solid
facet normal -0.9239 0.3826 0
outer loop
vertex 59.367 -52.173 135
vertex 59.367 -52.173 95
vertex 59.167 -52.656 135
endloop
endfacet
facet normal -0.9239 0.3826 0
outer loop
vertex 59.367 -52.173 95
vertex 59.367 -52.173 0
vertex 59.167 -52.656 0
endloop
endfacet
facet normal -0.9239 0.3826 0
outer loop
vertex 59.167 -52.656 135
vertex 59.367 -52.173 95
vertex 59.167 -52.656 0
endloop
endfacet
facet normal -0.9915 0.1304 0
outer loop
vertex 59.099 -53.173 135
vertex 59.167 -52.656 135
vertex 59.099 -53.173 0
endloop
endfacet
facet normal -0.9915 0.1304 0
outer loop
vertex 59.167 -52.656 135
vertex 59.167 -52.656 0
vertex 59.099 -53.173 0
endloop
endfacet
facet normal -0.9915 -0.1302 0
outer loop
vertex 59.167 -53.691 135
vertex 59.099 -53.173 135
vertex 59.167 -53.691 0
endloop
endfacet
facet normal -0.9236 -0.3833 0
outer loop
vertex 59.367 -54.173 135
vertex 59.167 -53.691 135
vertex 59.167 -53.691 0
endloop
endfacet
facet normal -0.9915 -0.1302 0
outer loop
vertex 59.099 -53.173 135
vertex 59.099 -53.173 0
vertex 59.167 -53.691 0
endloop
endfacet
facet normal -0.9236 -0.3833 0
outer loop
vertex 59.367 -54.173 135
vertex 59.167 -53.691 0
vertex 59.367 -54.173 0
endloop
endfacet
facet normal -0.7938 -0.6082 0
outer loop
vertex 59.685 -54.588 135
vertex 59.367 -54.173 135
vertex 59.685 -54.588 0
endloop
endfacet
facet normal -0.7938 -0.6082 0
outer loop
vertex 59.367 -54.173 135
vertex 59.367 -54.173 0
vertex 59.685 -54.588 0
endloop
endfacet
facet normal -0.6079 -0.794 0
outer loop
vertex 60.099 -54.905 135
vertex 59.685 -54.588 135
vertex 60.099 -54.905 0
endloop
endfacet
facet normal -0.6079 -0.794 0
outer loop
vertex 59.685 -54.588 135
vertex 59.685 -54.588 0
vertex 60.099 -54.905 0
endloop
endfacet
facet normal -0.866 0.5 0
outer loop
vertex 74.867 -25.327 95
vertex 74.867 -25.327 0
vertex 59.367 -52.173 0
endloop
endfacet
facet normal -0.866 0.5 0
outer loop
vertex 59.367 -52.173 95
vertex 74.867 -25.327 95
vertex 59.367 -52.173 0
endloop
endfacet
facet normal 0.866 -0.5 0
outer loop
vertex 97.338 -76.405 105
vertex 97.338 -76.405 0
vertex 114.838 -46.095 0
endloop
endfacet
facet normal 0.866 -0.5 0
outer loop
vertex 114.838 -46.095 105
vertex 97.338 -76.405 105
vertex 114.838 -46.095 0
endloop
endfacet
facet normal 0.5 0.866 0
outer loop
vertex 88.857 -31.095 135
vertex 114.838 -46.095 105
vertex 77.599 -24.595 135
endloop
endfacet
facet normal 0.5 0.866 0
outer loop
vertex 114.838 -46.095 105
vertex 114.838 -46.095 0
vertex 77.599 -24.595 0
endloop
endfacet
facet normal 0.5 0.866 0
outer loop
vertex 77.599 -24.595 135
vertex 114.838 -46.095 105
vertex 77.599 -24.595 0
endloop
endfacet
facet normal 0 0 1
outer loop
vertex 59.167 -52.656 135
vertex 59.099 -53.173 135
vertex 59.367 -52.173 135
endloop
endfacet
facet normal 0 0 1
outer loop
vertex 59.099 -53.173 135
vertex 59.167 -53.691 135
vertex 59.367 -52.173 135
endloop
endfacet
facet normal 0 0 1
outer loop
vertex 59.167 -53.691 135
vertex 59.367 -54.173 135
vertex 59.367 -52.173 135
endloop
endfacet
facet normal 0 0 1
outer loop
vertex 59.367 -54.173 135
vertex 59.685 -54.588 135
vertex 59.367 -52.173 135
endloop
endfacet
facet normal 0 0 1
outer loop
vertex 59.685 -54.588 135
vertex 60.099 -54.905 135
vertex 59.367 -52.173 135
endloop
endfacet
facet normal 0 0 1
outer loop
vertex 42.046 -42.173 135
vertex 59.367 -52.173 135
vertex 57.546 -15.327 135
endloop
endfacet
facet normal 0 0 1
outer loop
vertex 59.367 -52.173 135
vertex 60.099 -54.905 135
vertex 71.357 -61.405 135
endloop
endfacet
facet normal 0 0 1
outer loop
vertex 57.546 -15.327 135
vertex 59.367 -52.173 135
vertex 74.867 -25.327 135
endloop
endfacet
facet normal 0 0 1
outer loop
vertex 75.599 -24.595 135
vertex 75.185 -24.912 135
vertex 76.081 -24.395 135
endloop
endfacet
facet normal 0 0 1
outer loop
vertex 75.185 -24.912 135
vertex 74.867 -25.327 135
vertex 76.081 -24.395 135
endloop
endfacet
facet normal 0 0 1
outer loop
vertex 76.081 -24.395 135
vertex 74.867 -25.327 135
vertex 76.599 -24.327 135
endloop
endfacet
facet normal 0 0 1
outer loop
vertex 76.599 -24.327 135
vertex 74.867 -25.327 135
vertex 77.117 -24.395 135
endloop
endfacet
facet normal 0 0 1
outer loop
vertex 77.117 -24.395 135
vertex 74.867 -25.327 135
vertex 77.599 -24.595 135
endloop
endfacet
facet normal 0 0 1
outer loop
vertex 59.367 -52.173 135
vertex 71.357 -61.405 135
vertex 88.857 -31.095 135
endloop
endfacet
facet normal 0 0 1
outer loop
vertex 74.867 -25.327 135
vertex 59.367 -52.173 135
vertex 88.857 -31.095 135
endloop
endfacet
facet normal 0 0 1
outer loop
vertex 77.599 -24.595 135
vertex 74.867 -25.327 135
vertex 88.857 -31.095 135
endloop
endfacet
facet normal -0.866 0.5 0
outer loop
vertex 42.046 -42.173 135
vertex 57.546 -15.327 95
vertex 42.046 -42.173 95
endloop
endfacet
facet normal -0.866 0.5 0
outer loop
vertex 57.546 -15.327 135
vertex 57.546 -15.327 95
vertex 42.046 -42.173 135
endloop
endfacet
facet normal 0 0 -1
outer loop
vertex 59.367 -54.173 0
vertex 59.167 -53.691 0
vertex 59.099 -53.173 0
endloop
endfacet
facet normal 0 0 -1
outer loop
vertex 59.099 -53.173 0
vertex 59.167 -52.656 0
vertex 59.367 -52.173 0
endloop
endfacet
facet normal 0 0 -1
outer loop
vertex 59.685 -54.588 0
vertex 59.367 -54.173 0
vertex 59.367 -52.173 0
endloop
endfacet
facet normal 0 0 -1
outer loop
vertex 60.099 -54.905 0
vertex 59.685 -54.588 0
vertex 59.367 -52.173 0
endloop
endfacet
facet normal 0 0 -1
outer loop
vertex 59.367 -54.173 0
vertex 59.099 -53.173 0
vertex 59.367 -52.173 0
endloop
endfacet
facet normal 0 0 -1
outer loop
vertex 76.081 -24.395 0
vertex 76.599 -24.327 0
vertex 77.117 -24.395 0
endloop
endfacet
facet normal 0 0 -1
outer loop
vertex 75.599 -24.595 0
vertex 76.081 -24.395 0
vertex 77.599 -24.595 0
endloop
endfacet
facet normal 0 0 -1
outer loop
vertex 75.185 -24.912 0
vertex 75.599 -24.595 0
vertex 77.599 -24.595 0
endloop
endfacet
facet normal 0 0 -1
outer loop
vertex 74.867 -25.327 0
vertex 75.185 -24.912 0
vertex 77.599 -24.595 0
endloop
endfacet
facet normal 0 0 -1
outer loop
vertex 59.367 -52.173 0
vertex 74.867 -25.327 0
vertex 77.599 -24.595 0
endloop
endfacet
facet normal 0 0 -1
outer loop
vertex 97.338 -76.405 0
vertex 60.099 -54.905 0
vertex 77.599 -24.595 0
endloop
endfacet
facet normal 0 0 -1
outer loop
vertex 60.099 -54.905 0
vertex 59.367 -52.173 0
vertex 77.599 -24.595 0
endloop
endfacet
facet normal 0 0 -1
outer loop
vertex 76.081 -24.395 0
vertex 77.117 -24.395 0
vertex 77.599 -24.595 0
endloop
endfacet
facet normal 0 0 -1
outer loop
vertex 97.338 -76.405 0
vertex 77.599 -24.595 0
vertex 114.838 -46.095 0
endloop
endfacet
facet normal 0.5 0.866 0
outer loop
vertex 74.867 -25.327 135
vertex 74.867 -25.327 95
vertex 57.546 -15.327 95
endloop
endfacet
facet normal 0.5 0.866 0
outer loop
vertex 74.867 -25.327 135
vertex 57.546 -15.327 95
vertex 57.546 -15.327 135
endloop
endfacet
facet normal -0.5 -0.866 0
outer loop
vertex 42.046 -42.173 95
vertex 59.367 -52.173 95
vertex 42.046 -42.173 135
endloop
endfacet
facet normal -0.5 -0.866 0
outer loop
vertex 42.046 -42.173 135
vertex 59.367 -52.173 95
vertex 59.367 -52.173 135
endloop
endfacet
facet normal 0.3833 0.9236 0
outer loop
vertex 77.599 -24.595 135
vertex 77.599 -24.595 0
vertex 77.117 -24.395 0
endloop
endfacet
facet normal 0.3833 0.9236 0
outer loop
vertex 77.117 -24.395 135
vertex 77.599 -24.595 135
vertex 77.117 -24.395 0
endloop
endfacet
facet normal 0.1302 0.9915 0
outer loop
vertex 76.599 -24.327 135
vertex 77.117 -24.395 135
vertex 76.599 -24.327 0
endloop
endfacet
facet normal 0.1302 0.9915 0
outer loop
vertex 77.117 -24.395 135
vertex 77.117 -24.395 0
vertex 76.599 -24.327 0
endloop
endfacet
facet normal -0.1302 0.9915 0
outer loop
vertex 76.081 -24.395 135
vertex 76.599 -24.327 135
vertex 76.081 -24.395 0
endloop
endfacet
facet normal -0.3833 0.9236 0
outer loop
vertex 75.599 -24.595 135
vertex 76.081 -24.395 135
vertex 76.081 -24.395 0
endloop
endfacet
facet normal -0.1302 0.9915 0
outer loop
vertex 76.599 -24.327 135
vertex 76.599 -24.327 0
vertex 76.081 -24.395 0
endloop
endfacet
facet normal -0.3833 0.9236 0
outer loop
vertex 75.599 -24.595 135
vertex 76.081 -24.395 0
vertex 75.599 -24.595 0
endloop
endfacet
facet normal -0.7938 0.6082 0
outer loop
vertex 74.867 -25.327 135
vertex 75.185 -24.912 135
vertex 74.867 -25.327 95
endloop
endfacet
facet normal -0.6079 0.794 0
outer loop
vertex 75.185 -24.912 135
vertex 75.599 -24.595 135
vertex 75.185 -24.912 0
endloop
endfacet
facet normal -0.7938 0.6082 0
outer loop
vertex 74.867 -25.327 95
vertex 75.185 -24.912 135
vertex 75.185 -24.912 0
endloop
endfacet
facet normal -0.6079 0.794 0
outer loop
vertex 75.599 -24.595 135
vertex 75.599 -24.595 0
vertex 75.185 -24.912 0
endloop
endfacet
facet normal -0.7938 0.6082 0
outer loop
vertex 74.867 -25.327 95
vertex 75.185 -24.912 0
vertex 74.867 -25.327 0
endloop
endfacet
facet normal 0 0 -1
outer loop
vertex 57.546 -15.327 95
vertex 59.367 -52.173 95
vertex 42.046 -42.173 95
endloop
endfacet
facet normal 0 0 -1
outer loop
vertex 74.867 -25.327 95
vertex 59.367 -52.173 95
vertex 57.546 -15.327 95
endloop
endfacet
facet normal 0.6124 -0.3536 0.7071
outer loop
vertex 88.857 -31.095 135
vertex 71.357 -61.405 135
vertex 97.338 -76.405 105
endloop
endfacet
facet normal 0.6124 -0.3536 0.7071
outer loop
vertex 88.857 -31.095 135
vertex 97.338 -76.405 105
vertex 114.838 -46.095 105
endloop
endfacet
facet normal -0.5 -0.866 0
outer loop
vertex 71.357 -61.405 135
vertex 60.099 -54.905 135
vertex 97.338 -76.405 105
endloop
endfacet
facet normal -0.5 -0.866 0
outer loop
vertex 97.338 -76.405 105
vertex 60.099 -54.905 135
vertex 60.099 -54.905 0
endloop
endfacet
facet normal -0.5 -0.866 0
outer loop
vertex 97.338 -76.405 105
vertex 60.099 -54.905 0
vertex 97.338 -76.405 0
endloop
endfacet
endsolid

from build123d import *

# Parameters (mm, degrees)
BOSS_EXTRUDE1_DEPTH = 135
SKETCH3_W           = 40
SKETCH3_H           = 31
BOSS_EXTRUDE2_DEPTH = 20
CHAMFER1_SIZE       = 30


with BuildPart() as part:
    # Sketch2 → Boss-Extrude1 (new body)
    with BuildSketch(Plane.XY):
        with BuildLine():
            Line((114.838111964, -46.094555434), (77.599019601, -24.594555434))
            ThreePointArc((77.599019601, -24.594555434), (76.081381511, -24.394754589), (74.866968793, -25.326606241))
            Line((74.866968793, -25.326606241), (59.366968793, -52.173393759))
            ThreePointArc((59.366968793, -52.173393759), (59.167167948, -53.691031849), (60.099019601, -54.905444566))
            Line((60.099019601, -54.905444566), (97.338111964, -76.405444566))
            Line((97.338111964, -76.405444566), (114.838111964, -46.094555434))
        make_face()
    extrude(amount=BOSS_EXTRUDE1_DEPTH)

    # Sketch3 → Boss-Extrude2 (add)
    with BuildSketch(Plane(origin=(67.116968793, -38.75, 0), x_dir=(0, 0, 1), z_dir=(-0.866025404, 0.5, 0))):
        with Locations((115, 0)):
            Rectangle(SKETCH3_W, SKETCH3_H)
    extrude(amount=BOSS_EXTRUDE2_DEPTH)

    # Chamfer1
    chamfer1_edges = [part.edges().sort_by_distance(p)[0] for p in [
        (106.088111964, -61.25, 135),
    ]]
    chamfer(chamfer1_edges, length=CHAMFER1_SIZE)


solid = part.part
